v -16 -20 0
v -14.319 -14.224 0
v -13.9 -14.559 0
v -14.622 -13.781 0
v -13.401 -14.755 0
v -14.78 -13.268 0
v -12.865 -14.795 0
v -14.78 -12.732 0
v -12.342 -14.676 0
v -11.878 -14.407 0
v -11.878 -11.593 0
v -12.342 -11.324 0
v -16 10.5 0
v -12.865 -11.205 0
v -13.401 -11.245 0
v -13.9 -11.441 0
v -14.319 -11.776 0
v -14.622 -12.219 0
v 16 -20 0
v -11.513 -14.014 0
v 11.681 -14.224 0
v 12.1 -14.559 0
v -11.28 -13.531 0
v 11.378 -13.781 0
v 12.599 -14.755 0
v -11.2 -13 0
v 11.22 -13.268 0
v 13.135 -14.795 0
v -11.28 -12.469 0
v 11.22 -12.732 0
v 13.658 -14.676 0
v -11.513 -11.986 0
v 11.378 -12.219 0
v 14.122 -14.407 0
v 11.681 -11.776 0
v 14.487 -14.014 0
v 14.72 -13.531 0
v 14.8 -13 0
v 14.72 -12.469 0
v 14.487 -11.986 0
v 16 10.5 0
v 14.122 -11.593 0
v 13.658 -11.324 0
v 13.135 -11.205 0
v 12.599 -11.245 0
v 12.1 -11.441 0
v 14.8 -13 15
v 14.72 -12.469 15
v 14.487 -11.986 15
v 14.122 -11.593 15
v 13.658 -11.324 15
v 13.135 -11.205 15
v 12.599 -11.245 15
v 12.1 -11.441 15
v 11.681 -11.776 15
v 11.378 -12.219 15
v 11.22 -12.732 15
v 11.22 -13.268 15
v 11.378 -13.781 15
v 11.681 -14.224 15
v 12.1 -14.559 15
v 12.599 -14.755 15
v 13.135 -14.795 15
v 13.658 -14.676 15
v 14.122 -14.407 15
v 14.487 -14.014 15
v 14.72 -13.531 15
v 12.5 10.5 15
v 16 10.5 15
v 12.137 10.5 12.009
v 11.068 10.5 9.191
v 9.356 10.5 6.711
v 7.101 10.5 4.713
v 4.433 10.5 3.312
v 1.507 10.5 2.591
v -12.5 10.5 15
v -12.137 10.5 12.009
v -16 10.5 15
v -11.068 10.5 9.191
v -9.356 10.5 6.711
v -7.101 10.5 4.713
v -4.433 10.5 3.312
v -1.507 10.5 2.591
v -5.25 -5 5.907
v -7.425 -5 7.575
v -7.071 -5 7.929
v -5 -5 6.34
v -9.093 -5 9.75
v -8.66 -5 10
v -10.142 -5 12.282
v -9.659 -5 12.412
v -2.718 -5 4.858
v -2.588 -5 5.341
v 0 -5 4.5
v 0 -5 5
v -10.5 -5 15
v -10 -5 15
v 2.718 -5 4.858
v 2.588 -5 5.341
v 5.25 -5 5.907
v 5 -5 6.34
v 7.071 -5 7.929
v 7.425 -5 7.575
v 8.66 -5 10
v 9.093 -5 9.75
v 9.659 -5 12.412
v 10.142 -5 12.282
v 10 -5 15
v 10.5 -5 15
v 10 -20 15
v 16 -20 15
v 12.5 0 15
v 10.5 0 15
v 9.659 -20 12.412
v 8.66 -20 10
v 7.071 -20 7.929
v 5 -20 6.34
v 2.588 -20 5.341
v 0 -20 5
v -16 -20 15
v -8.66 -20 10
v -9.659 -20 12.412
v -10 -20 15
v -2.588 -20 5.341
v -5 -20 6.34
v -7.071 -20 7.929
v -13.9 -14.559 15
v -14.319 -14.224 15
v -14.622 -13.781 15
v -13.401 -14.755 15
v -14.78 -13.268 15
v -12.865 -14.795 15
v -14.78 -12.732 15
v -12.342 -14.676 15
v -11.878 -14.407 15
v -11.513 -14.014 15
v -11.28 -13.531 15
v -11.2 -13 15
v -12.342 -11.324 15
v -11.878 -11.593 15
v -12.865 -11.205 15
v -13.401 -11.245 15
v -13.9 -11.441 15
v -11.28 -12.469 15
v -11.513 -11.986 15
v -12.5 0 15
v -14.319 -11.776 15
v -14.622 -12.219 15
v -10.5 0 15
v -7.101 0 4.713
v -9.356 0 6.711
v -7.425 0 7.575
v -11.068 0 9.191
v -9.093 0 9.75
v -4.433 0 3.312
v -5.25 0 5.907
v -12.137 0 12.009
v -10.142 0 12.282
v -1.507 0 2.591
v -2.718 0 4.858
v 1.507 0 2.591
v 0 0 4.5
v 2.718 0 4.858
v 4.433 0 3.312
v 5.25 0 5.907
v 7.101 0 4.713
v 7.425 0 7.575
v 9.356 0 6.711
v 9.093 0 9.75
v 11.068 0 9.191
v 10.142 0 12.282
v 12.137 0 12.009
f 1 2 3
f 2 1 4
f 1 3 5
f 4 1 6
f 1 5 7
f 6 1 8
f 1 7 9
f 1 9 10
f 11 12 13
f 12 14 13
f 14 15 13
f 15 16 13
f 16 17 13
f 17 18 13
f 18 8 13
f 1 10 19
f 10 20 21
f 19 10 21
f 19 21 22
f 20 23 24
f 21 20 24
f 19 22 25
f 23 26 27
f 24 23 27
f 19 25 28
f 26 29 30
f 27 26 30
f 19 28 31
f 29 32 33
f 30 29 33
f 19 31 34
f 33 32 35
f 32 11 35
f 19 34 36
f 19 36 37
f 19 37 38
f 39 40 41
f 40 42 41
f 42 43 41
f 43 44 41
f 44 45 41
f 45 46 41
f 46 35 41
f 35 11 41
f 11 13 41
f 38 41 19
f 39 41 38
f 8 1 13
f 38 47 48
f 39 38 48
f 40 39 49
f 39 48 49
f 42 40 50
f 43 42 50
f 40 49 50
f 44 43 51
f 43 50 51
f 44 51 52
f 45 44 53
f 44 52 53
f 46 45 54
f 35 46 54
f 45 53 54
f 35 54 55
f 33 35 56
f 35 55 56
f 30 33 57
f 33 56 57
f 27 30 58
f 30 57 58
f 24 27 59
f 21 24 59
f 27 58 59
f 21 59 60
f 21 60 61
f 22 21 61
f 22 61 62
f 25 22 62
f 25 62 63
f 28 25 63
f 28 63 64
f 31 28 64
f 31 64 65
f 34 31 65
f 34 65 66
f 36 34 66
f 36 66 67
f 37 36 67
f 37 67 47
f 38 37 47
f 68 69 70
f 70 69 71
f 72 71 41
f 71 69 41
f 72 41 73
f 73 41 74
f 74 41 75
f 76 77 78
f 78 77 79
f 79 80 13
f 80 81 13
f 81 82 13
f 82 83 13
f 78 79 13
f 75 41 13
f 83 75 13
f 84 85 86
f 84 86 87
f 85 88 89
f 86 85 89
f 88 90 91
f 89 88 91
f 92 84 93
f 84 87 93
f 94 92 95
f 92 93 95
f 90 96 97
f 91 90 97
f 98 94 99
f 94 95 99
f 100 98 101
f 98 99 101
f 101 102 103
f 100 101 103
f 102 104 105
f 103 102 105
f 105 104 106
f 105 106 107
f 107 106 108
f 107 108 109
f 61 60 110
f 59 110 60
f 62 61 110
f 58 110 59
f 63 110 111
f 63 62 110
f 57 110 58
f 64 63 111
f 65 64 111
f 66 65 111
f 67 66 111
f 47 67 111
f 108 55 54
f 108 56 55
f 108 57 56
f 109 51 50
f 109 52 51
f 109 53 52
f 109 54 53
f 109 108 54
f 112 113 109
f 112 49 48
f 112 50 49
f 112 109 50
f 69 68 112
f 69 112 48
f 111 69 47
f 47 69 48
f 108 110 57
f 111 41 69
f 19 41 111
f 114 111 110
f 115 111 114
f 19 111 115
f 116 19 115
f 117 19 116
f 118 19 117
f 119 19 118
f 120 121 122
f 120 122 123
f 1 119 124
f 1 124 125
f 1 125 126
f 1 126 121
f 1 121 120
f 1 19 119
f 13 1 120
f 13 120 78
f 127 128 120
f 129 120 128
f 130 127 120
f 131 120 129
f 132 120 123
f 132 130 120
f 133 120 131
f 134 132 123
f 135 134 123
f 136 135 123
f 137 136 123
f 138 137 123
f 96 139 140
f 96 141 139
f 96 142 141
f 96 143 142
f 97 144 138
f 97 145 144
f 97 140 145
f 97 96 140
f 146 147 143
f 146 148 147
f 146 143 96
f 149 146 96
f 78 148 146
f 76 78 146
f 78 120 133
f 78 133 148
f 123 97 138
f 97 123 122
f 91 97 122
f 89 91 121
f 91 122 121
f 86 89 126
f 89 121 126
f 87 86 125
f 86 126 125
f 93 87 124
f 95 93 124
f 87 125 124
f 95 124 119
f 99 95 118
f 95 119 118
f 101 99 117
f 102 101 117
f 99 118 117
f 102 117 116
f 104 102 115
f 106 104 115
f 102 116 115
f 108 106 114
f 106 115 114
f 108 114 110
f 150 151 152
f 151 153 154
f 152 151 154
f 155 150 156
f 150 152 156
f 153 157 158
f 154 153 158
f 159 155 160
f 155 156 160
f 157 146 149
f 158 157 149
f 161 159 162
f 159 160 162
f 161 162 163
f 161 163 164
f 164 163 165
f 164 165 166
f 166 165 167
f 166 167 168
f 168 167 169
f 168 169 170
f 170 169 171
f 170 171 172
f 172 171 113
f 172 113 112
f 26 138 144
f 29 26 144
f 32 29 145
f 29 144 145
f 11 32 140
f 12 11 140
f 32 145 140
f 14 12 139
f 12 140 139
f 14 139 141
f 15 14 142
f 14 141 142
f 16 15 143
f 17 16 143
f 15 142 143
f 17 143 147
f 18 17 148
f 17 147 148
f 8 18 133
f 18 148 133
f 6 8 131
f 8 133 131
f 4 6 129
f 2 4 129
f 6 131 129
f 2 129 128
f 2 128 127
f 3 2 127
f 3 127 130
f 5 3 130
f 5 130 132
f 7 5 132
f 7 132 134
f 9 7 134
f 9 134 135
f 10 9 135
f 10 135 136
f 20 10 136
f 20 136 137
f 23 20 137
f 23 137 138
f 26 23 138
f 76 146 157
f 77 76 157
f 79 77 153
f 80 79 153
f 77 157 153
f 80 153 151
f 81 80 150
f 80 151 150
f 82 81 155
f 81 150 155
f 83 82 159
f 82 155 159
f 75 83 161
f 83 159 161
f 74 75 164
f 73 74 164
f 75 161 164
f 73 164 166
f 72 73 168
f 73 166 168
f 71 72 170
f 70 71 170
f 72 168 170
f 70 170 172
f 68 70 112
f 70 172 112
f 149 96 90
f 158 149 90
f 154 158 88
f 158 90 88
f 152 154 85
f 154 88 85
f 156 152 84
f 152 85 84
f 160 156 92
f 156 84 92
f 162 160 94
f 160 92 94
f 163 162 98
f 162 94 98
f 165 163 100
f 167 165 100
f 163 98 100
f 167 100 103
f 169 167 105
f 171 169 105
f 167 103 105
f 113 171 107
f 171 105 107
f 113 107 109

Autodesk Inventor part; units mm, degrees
ref_plane "YZ Plane" through (0, 0, 0) normal (1, 0, 0) x (0, 1, 0)
ref_plane "XZ Plane" through (0, 0, 0) normal (0, 1, 0) x (-1, 0, 0)
sketch "Skizze1" plane through (0, 0, 0) normal (0, 0, 1) x (1, 0, 0)
  line L0 (-16, 20) -> (16, 20)
  line L1 (16, 20) -> (16, -20)
  line L2 (16, -20) -> (-16, -20)
  line L3 (-16, -20) -> (-16, 20)
  line L4 (-16, 20) -> (16, -20) construction
  line L5 (16, 20) -> (-16, -20) construction
  point P0 (0, 0)
  dimension "d0" = 32
  dimension "d1" = 40
extrude "Extrusion1" add sketch "Skizze1" along normal blind 15
sketch "Skizze2" plane through (-16, -20, 0) normal (0, -1, 0) x (1, 0, 0)
  line L0 (0, 15) -> (32, 15) projected
  line L1 (0, 0) -> (0, 15) projected
  line L2 (32, 0) -> (0, 0) projected
  line L3 (32, 0) -> (32, 15) projected
  line L4 (32, 15) -> (0, 15) projected
  circle A0 centre (16, 15) radius 10
  point P0 (16, 0)
  dimension "d4" = 20
extrude "Extrusion2" cut sketch "Skizze2" against normal blind 15 contours A0 L0 | L0 A0
sketch "Skizze3" plane through (-16, -5, 0) normal (0, -1, 0) x (1, 0, 0)
  line L0 (0, 0) -> (0, 15) projected
  line L1 (32, 0) -> (0, 0) projected
  line L2 (32, 0) -> (32, 15) projected
  line L3 (26, 15) -> (32, 15) projected
  line L4 (0, 15) -> (6, 15) projected
  line L5 (6, 15) -> (26, 15) projected
  circle A0 centre (16, 15) radius 10.5
  point P0 (16, 0)
  dimension "d7" = 21
extrude "Extrusion3" cut sketch "Skizze3" against normal blind 5 contours A0 L3 L5 L4 | L4 L5 L3 A0
sketch "Skizze4" plane through (-16, 0, 0) normal (0, -1, 0) x (1, 0, 0)
  line L0 (5.5, 15) -> (26.5, 15) projected
  circle A0 centre (16, 15) radius 12.5
  point P0 (16, 0)
  dimension "d10" = 25
extrude "Extrusion4" cut sketch "Skizze4" against normal through all
sketch "Skizze5" plane through (0, 0, 15) normal (0, 0, 1) x (1, 0, 0)
  line L0 (-16, 20) -> (-16, -20) projected
  line L1 (-16, -20) -> (-10, -20) projected
  line L2 (-10, -20) -> (-10, -5) projected
  line L3 (10, -5) -> (10, -20) projected
  line L4 (10, -20) -> (16, -20) projected
  line L5 (16, -20) -> (16, 20) projected
  circle A0 centre (-13, -13) radius 1.8
  circle A1 centre (13, -13) radius 1.8
  point P0 (0, 0)
  dimension "d13" = 3.6
  dimension "d14" = 3.6
  dimension "d15" = 7
  dimension "d16" = 7
  dimension "d17" = 3
  dimension "d18" = 3
extrude "Extrusion5" cut sketch "Skizze5" against normal through all
sketch "Skizze6" plane through (0, 0, 0) normal (0, 0, 1) x (1, 0, 0)
  line L0 (16, 20) -> (16, -20) projected
  line L1 (-16, 20) -> (16, 20)
  line L2 (16, 20) -> (16, 10.5)
  line L3 (16, 10.5) -> (-16, 10.5)
  line L4 (-16, 10.5) -> (-16, 20)
  point P0 (0, 0)
  dimension "d21" = 9.5
extrude "Extrusion6" cut sketch "Skizze6" along normal blind 15
properties part number "5 Objektivhalterung oben 29112018"
